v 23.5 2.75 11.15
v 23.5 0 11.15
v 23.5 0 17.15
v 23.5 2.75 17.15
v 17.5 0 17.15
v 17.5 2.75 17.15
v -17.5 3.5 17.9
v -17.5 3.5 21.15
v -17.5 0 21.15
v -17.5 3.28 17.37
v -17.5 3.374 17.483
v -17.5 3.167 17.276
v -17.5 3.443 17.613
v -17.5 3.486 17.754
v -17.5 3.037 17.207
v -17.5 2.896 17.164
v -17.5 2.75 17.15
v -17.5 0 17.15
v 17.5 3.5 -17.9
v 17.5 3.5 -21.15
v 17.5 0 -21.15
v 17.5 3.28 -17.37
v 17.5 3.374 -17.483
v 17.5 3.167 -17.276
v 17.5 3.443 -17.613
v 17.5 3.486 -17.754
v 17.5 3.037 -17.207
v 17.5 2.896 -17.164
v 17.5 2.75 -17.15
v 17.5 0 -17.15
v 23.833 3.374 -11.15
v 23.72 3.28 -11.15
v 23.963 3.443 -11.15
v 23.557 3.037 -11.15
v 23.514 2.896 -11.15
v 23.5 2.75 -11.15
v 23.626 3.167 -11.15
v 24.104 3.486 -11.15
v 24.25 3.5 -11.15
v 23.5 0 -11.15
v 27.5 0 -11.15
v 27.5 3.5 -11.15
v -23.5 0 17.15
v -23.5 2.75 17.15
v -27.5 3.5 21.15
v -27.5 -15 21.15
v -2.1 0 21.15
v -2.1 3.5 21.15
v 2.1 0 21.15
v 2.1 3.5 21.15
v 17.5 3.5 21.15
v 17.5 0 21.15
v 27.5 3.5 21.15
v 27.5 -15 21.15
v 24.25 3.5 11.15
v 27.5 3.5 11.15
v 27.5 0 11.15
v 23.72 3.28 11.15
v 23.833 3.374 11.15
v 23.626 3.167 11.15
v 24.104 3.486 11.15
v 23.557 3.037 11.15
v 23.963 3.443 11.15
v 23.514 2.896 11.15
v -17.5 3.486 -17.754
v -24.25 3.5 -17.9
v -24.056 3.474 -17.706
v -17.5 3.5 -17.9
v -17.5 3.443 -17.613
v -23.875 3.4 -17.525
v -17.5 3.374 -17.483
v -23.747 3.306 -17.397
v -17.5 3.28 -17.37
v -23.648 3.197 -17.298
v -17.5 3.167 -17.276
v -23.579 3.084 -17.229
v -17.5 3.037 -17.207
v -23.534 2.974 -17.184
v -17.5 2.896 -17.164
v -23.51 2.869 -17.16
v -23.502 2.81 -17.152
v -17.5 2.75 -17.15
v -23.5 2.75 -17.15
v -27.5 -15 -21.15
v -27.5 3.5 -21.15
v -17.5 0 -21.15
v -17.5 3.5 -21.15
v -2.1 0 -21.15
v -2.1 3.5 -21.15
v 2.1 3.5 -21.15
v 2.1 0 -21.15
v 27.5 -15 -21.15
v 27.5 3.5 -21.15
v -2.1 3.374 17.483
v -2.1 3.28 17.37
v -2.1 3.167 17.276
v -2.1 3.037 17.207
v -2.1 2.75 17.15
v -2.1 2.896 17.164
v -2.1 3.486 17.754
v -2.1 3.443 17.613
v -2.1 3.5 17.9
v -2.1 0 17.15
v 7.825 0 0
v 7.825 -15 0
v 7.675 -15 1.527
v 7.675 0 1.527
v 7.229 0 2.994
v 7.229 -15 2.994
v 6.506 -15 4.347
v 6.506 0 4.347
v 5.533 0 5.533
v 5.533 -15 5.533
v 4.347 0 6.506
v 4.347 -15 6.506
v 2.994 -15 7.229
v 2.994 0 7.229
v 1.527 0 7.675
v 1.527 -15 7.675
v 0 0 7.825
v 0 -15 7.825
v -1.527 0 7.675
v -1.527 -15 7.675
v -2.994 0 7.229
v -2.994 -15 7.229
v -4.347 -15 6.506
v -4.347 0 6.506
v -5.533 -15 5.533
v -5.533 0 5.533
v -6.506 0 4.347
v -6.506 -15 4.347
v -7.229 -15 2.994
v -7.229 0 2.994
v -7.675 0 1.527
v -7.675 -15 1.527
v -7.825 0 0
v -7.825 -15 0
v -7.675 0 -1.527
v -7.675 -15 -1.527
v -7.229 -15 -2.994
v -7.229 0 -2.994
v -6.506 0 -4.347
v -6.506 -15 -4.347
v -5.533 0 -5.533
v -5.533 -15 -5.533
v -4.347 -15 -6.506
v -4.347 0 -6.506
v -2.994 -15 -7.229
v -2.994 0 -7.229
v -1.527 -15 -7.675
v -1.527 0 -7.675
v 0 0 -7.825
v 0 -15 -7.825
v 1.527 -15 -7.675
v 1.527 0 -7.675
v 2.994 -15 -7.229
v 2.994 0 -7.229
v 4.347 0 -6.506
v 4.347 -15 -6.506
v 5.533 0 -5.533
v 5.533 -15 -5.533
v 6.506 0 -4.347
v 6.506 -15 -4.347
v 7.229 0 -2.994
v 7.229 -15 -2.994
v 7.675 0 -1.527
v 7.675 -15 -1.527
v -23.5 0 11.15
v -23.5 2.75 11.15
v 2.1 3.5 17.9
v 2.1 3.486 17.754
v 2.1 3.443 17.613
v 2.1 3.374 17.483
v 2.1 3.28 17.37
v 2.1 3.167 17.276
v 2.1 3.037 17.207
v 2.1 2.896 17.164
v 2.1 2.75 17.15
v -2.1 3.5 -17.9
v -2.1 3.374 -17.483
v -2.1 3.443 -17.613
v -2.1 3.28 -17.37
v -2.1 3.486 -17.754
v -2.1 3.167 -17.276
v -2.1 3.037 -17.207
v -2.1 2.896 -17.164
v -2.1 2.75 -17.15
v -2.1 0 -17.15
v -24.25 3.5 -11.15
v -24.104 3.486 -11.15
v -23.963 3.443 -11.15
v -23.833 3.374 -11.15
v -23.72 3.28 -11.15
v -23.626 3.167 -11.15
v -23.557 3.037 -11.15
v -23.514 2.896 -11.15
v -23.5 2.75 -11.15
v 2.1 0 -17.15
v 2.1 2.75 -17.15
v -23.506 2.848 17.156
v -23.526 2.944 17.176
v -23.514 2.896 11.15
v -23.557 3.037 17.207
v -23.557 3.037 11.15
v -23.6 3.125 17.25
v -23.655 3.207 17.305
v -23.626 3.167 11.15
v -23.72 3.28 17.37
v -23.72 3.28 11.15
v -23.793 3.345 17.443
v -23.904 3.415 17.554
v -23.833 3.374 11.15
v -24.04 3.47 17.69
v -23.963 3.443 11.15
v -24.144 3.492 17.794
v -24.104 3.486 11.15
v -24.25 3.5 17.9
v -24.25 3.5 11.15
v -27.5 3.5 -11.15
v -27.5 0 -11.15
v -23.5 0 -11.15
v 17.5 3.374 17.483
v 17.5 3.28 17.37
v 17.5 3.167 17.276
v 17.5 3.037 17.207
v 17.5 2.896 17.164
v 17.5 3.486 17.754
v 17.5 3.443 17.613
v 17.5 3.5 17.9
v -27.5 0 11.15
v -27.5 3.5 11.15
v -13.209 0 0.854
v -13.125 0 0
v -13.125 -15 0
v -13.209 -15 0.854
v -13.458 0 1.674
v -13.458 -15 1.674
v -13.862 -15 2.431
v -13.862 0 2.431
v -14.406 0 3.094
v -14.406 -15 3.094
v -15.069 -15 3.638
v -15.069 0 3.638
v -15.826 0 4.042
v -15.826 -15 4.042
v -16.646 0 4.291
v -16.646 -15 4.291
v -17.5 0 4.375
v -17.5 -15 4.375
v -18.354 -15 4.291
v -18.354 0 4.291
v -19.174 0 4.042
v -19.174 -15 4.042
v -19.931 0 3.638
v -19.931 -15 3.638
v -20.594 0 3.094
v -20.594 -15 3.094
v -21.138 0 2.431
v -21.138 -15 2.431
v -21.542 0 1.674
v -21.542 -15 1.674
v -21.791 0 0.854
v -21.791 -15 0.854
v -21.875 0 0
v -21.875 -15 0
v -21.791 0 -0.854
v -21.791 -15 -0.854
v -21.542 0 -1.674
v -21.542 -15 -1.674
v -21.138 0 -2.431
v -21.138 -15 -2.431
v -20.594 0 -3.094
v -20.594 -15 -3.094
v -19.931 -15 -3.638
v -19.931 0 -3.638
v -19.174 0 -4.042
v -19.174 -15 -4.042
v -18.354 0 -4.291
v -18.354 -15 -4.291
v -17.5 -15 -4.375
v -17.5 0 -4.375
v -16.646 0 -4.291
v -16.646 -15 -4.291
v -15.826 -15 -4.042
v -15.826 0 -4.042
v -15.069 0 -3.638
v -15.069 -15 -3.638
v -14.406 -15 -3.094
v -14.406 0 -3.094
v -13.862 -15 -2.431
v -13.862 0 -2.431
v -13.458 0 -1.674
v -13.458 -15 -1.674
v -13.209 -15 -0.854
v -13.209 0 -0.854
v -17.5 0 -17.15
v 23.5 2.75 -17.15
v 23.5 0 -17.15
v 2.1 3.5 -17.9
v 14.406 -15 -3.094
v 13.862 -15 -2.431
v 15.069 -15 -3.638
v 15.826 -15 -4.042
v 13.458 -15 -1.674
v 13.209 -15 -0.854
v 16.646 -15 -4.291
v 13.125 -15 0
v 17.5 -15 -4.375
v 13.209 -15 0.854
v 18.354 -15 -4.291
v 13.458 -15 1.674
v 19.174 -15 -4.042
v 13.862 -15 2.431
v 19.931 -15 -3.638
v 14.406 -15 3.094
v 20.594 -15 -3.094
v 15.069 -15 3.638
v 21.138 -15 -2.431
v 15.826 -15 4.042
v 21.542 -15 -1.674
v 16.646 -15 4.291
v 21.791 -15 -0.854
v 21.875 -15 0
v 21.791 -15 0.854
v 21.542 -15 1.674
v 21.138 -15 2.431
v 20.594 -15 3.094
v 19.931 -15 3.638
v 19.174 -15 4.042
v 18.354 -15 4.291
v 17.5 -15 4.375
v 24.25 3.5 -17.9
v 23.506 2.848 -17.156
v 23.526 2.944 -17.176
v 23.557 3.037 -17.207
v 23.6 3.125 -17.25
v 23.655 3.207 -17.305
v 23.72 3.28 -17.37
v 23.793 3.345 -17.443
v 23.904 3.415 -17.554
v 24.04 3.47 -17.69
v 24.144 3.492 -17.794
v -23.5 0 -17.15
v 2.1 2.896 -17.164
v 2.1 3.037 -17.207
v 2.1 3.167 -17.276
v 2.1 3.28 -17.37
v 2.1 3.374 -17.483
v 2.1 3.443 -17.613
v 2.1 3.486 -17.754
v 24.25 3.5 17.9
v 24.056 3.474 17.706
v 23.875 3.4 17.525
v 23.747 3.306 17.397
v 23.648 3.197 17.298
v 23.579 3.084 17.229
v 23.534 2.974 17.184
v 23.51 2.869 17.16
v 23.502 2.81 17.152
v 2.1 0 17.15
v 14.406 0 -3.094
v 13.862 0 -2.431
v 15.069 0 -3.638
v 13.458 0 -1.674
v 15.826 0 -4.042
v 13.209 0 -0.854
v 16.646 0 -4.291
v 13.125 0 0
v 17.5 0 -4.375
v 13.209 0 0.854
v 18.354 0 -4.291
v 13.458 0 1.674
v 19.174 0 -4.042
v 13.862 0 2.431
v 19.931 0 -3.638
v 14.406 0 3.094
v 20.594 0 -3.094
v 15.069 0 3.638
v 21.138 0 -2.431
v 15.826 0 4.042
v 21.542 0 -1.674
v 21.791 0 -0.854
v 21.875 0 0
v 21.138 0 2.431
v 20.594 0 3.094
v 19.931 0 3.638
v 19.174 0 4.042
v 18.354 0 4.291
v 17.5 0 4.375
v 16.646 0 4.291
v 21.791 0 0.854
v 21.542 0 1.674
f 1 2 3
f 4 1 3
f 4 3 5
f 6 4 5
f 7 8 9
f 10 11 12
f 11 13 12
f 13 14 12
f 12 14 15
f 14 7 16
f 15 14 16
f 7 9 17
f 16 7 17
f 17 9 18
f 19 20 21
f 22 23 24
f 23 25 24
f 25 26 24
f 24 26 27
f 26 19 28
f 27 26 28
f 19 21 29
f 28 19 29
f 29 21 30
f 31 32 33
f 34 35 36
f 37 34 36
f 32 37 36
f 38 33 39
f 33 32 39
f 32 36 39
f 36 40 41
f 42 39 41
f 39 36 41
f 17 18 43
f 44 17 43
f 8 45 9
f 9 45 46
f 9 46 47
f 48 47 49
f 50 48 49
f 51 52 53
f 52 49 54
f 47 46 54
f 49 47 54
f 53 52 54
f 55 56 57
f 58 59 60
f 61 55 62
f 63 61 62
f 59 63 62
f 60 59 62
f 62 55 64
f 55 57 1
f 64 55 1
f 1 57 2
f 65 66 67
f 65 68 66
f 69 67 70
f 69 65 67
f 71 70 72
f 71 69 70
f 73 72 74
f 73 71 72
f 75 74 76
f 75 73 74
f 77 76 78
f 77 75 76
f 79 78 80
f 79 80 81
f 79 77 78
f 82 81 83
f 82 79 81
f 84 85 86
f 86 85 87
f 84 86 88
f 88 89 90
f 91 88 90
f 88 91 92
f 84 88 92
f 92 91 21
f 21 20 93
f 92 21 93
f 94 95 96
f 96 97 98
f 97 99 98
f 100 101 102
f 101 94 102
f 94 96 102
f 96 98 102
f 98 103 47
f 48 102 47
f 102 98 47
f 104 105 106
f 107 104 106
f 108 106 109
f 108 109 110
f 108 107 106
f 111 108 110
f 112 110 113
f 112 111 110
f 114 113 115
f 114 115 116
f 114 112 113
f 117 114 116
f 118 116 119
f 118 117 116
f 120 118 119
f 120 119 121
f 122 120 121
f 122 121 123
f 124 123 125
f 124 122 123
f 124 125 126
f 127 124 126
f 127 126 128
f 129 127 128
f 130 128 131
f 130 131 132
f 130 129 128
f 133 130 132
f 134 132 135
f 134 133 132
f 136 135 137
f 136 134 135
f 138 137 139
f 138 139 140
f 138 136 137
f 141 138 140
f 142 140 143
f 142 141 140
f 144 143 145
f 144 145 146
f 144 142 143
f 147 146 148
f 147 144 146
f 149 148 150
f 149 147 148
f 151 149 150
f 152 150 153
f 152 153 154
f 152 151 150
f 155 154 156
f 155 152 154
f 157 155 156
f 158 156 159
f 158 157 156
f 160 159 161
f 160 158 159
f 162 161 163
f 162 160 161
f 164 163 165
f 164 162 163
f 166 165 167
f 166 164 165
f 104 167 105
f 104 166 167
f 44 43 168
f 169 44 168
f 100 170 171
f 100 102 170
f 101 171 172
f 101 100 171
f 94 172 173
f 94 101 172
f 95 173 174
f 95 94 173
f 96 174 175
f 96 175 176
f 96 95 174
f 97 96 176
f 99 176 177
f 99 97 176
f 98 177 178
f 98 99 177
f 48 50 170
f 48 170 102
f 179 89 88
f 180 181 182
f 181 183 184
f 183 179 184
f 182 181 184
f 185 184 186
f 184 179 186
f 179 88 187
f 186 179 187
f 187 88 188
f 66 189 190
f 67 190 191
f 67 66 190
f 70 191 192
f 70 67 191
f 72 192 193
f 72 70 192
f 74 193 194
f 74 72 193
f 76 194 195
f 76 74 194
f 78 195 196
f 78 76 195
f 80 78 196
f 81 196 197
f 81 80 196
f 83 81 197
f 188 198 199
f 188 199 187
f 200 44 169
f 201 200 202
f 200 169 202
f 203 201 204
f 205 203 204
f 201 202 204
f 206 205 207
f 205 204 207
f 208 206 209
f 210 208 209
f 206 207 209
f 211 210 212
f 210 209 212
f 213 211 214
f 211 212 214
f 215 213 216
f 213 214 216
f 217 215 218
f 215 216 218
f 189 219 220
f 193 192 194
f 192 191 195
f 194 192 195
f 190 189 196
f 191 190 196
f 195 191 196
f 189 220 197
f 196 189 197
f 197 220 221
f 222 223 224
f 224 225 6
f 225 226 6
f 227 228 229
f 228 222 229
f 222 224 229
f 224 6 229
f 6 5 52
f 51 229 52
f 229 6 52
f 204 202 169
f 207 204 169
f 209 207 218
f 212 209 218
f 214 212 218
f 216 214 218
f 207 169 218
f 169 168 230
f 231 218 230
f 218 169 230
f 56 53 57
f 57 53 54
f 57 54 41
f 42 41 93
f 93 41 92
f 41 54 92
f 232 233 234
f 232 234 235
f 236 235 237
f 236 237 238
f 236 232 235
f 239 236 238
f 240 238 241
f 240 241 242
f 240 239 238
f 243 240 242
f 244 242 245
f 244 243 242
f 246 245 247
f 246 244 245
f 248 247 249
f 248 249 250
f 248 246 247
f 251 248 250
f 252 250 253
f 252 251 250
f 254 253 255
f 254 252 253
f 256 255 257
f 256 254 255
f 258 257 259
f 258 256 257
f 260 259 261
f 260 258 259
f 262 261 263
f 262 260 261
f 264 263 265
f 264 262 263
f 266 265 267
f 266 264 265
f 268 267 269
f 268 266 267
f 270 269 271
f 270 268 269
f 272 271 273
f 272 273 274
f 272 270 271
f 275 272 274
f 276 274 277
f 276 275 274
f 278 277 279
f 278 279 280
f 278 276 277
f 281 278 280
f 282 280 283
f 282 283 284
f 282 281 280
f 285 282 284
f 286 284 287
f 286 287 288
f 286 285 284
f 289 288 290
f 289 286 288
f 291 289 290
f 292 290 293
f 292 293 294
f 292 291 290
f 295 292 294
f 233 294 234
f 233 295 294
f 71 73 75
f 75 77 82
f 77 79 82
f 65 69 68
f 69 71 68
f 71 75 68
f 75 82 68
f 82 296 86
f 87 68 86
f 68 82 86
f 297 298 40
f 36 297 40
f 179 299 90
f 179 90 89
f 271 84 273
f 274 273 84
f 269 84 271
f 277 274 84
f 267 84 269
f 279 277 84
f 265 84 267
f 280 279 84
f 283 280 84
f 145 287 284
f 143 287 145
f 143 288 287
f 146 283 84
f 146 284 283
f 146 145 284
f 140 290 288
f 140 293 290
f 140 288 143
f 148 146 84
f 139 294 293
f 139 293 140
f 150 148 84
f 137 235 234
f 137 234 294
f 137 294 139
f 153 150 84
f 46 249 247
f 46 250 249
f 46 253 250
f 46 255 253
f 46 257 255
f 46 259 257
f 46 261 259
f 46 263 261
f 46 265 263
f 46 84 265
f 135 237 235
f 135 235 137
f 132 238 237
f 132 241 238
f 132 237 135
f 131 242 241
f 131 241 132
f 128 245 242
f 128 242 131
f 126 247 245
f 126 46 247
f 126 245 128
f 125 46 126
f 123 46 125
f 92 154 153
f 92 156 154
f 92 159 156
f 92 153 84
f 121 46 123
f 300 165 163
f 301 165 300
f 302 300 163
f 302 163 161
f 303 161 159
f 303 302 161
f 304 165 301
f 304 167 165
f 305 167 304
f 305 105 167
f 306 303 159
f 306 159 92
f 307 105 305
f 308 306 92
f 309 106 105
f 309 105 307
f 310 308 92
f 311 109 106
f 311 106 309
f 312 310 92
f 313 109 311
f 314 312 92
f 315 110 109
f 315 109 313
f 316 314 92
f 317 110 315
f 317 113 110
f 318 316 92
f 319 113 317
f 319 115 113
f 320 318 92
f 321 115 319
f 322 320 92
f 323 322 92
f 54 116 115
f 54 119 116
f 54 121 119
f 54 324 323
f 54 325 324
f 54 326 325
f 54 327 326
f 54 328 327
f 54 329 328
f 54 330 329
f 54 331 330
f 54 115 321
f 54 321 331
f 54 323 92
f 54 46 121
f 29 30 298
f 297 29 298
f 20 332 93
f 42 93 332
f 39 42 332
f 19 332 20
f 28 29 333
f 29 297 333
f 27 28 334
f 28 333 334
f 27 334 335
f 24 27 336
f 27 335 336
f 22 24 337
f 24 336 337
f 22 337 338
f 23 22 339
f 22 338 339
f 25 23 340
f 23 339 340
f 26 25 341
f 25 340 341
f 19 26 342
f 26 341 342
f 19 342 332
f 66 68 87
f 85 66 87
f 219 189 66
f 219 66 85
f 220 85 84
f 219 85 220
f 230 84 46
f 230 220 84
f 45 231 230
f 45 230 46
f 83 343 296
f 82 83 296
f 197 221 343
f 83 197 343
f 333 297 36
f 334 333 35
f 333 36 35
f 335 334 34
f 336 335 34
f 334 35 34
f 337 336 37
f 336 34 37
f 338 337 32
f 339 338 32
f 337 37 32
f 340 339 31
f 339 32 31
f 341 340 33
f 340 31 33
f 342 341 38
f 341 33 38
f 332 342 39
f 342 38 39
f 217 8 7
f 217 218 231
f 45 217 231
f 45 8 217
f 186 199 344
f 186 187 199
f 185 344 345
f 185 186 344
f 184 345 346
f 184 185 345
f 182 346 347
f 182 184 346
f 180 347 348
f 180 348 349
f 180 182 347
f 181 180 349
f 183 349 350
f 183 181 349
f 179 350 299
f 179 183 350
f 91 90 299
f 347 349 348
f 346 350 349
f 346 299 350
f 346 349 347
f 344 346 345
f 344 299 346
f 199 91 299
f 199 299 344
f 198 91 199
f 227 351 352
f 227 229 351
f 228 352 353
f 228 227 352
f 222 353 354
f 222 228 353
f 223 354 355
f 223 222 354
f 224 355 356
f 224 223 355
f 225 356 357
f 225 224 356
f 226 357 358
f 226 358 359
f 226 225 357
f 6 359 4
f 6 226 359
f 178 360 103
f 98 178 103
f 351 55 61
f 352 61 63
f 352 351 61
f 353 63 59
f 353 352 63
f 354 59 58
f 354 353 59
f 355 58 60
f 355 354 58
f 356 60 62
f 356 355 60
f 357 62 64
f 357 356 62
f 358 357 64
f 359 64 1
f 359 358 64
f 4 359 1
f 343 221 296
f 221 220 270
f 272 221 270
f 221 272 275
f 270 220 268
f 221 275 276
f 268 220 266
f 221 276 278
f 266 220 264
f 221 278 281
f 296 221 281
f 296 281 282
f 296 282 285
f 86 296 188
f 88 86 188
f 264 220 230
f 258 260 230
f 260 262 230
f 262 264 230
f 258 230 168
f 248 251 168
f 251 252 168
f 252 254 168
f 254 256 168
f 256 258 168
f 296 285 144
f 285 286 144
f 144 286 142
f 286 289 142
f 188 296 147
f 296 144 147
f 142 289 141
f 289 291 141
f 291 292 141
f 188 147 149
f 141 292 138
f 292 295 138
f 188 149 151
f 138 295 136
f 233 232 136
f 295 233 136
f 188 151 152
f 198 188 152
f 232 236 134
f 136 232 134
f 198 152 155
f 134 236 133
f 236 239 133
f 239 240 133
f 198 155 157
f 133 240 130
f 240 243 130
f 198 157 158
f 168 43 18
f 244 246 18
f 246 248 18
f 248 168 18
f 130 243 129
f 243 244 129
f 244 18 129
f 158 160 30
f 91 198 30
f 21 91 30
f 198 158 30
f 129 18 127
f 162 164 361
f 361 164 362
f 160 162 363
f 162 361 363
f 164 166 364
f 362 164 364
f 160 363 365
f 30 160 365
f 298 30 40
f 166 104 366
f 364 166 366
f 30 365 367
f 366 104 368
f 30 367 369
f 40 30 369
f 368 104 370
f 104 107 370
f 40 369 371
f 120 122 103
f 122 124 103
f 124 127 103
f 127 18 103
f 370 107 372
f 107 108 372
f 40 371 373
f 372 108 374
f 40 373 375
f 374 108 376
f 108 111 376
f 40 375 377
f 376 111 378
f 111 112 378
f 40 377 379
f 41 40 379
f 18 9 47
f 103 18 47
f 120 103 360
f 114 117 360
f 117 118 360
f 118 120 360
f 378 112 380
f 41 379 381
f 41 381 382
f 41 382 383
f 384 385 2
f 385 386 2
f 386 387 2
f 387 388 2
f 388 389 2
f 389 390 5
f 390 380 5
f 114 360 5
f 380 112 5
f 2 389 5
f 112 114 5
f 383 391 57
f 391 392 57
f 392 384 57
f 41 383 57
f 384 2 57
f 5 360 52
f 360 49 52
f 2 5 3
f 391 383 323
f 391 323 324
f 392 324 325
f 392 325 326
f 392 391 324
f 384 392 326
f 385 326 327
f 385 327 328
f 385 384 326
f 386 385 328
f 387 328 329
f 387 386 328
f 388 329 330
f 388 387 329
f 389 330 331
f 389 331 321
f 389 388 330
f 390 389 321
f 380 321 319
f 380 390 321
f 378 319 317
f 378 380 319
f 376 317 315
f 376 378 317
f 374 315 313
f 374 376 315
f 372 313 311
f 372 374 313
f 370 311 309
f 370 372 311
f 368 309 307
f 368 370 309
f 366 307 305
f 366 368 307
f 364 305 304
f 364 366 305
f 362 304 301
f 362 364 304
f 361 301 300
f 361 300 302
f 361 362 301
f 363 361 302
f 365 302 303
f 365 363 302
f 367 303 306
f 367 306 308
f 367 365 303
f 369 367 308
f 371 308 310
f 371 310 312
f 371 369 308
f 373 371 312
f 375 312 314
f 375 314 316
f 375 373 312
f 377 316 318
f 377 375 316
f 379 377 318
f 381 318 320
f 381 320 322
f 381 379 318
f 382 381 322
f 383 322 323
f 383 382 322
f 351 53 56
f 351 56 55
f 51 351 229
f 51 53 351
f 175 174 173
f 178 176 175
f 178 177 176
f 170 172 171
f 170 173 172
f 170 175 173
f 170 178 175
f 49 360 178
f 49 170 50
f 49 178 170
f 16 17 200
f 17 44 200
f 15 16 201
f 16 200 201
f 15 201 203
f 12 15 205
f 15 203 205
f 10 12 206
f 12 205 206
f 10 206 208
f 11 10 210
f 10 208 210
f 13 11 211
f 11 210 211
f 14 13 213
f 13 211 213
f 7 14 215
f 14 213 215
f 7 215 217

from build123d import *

# Parameters (mm, degrees)
F0_W     = 55
F0_H     = 42.3
F0_R     = 4.375
F0_R_2   = 7.825
F1_DEPTH = 15
F2_W     = 4.2
F2_H     = 4
F3_DEPTH = 3.5
F4_R     = 0.75


with BuildPart() as f1:
    # F0 (on Front) → F1 (new body)
    with BuildSketch(Plane.XZ):
        Rectangle(F0_W, F0_H)
        with Locations((-17.5, 0)):
            Circle(F0_R, mode=Mode.SUBTRACT)
        Circle(F0_R_2, mode=Mode.SUBTRACT)
        with Locations((17.5, 0)):
            Circle(F0_R, mode=Mode.SUBTRACT)
    extrude(amount=F1_DEPTH)

    # F2 (on face) → F3 (join)
    with BuildSketch(Plane(origin=(0, 0, 0), x_dir=(-1, 0, 0), z_dir=(0, 1, 0))):
        with Locations((0, 19.15)):
            Rectangle(F2_W, F2_H)
        with Locations((0, -19.15)):
            Rectangle(F2_W, F2_H)
        Polygon((-17.5, 17.15), (-17.5, 21.15), (-27.5, 21.15), (-27.5, 11.15), (-23.5, 11.15), (-23.5, 17.15), align=None)
        Polygon((-23.5, -11.15), (-27.5, -11.15), (-27.5, -21.15), (-17.5, -21.15), (-17.5, -17.15), (-23.5, -17.15), align=None)
        Polygon((27.5, 21.15), (17.5, 21.15), (17.5, 17.15), (23.5, 17.15), (23.5, 11.15), (27.5, 11.15), align=None)
        Polygon((27.5, -21.15), (27.5, -11.15), (23.5, -11.15), (23.5, -17.15), (17.5, -17.15), (17.5, -21.15), align=None)
    extrude(amount=F3_DEPTH)

    # F4
    f4_edges = [f1.edges().sort_by_distance(p)[0] for p in [
        (0, 3.5, -17.15),
        (0, 3.5, 17.15),
        (20.5, 3.5, 17.15),
        (23.5, 3.5, 14.15),
        (23.5, 3.5, -14.15),
        (20.5, 3.5, -17.15),
        (-20.5, 3.5, -17.15),
        (-23.5, 3.5, -14.15),
        (-23.5, 3.5, 14.15),
        (-20.5, 3.5, 17.15),
    ]]
    fillet(f4_edges, radius=F4_R)


solid = f1.part
